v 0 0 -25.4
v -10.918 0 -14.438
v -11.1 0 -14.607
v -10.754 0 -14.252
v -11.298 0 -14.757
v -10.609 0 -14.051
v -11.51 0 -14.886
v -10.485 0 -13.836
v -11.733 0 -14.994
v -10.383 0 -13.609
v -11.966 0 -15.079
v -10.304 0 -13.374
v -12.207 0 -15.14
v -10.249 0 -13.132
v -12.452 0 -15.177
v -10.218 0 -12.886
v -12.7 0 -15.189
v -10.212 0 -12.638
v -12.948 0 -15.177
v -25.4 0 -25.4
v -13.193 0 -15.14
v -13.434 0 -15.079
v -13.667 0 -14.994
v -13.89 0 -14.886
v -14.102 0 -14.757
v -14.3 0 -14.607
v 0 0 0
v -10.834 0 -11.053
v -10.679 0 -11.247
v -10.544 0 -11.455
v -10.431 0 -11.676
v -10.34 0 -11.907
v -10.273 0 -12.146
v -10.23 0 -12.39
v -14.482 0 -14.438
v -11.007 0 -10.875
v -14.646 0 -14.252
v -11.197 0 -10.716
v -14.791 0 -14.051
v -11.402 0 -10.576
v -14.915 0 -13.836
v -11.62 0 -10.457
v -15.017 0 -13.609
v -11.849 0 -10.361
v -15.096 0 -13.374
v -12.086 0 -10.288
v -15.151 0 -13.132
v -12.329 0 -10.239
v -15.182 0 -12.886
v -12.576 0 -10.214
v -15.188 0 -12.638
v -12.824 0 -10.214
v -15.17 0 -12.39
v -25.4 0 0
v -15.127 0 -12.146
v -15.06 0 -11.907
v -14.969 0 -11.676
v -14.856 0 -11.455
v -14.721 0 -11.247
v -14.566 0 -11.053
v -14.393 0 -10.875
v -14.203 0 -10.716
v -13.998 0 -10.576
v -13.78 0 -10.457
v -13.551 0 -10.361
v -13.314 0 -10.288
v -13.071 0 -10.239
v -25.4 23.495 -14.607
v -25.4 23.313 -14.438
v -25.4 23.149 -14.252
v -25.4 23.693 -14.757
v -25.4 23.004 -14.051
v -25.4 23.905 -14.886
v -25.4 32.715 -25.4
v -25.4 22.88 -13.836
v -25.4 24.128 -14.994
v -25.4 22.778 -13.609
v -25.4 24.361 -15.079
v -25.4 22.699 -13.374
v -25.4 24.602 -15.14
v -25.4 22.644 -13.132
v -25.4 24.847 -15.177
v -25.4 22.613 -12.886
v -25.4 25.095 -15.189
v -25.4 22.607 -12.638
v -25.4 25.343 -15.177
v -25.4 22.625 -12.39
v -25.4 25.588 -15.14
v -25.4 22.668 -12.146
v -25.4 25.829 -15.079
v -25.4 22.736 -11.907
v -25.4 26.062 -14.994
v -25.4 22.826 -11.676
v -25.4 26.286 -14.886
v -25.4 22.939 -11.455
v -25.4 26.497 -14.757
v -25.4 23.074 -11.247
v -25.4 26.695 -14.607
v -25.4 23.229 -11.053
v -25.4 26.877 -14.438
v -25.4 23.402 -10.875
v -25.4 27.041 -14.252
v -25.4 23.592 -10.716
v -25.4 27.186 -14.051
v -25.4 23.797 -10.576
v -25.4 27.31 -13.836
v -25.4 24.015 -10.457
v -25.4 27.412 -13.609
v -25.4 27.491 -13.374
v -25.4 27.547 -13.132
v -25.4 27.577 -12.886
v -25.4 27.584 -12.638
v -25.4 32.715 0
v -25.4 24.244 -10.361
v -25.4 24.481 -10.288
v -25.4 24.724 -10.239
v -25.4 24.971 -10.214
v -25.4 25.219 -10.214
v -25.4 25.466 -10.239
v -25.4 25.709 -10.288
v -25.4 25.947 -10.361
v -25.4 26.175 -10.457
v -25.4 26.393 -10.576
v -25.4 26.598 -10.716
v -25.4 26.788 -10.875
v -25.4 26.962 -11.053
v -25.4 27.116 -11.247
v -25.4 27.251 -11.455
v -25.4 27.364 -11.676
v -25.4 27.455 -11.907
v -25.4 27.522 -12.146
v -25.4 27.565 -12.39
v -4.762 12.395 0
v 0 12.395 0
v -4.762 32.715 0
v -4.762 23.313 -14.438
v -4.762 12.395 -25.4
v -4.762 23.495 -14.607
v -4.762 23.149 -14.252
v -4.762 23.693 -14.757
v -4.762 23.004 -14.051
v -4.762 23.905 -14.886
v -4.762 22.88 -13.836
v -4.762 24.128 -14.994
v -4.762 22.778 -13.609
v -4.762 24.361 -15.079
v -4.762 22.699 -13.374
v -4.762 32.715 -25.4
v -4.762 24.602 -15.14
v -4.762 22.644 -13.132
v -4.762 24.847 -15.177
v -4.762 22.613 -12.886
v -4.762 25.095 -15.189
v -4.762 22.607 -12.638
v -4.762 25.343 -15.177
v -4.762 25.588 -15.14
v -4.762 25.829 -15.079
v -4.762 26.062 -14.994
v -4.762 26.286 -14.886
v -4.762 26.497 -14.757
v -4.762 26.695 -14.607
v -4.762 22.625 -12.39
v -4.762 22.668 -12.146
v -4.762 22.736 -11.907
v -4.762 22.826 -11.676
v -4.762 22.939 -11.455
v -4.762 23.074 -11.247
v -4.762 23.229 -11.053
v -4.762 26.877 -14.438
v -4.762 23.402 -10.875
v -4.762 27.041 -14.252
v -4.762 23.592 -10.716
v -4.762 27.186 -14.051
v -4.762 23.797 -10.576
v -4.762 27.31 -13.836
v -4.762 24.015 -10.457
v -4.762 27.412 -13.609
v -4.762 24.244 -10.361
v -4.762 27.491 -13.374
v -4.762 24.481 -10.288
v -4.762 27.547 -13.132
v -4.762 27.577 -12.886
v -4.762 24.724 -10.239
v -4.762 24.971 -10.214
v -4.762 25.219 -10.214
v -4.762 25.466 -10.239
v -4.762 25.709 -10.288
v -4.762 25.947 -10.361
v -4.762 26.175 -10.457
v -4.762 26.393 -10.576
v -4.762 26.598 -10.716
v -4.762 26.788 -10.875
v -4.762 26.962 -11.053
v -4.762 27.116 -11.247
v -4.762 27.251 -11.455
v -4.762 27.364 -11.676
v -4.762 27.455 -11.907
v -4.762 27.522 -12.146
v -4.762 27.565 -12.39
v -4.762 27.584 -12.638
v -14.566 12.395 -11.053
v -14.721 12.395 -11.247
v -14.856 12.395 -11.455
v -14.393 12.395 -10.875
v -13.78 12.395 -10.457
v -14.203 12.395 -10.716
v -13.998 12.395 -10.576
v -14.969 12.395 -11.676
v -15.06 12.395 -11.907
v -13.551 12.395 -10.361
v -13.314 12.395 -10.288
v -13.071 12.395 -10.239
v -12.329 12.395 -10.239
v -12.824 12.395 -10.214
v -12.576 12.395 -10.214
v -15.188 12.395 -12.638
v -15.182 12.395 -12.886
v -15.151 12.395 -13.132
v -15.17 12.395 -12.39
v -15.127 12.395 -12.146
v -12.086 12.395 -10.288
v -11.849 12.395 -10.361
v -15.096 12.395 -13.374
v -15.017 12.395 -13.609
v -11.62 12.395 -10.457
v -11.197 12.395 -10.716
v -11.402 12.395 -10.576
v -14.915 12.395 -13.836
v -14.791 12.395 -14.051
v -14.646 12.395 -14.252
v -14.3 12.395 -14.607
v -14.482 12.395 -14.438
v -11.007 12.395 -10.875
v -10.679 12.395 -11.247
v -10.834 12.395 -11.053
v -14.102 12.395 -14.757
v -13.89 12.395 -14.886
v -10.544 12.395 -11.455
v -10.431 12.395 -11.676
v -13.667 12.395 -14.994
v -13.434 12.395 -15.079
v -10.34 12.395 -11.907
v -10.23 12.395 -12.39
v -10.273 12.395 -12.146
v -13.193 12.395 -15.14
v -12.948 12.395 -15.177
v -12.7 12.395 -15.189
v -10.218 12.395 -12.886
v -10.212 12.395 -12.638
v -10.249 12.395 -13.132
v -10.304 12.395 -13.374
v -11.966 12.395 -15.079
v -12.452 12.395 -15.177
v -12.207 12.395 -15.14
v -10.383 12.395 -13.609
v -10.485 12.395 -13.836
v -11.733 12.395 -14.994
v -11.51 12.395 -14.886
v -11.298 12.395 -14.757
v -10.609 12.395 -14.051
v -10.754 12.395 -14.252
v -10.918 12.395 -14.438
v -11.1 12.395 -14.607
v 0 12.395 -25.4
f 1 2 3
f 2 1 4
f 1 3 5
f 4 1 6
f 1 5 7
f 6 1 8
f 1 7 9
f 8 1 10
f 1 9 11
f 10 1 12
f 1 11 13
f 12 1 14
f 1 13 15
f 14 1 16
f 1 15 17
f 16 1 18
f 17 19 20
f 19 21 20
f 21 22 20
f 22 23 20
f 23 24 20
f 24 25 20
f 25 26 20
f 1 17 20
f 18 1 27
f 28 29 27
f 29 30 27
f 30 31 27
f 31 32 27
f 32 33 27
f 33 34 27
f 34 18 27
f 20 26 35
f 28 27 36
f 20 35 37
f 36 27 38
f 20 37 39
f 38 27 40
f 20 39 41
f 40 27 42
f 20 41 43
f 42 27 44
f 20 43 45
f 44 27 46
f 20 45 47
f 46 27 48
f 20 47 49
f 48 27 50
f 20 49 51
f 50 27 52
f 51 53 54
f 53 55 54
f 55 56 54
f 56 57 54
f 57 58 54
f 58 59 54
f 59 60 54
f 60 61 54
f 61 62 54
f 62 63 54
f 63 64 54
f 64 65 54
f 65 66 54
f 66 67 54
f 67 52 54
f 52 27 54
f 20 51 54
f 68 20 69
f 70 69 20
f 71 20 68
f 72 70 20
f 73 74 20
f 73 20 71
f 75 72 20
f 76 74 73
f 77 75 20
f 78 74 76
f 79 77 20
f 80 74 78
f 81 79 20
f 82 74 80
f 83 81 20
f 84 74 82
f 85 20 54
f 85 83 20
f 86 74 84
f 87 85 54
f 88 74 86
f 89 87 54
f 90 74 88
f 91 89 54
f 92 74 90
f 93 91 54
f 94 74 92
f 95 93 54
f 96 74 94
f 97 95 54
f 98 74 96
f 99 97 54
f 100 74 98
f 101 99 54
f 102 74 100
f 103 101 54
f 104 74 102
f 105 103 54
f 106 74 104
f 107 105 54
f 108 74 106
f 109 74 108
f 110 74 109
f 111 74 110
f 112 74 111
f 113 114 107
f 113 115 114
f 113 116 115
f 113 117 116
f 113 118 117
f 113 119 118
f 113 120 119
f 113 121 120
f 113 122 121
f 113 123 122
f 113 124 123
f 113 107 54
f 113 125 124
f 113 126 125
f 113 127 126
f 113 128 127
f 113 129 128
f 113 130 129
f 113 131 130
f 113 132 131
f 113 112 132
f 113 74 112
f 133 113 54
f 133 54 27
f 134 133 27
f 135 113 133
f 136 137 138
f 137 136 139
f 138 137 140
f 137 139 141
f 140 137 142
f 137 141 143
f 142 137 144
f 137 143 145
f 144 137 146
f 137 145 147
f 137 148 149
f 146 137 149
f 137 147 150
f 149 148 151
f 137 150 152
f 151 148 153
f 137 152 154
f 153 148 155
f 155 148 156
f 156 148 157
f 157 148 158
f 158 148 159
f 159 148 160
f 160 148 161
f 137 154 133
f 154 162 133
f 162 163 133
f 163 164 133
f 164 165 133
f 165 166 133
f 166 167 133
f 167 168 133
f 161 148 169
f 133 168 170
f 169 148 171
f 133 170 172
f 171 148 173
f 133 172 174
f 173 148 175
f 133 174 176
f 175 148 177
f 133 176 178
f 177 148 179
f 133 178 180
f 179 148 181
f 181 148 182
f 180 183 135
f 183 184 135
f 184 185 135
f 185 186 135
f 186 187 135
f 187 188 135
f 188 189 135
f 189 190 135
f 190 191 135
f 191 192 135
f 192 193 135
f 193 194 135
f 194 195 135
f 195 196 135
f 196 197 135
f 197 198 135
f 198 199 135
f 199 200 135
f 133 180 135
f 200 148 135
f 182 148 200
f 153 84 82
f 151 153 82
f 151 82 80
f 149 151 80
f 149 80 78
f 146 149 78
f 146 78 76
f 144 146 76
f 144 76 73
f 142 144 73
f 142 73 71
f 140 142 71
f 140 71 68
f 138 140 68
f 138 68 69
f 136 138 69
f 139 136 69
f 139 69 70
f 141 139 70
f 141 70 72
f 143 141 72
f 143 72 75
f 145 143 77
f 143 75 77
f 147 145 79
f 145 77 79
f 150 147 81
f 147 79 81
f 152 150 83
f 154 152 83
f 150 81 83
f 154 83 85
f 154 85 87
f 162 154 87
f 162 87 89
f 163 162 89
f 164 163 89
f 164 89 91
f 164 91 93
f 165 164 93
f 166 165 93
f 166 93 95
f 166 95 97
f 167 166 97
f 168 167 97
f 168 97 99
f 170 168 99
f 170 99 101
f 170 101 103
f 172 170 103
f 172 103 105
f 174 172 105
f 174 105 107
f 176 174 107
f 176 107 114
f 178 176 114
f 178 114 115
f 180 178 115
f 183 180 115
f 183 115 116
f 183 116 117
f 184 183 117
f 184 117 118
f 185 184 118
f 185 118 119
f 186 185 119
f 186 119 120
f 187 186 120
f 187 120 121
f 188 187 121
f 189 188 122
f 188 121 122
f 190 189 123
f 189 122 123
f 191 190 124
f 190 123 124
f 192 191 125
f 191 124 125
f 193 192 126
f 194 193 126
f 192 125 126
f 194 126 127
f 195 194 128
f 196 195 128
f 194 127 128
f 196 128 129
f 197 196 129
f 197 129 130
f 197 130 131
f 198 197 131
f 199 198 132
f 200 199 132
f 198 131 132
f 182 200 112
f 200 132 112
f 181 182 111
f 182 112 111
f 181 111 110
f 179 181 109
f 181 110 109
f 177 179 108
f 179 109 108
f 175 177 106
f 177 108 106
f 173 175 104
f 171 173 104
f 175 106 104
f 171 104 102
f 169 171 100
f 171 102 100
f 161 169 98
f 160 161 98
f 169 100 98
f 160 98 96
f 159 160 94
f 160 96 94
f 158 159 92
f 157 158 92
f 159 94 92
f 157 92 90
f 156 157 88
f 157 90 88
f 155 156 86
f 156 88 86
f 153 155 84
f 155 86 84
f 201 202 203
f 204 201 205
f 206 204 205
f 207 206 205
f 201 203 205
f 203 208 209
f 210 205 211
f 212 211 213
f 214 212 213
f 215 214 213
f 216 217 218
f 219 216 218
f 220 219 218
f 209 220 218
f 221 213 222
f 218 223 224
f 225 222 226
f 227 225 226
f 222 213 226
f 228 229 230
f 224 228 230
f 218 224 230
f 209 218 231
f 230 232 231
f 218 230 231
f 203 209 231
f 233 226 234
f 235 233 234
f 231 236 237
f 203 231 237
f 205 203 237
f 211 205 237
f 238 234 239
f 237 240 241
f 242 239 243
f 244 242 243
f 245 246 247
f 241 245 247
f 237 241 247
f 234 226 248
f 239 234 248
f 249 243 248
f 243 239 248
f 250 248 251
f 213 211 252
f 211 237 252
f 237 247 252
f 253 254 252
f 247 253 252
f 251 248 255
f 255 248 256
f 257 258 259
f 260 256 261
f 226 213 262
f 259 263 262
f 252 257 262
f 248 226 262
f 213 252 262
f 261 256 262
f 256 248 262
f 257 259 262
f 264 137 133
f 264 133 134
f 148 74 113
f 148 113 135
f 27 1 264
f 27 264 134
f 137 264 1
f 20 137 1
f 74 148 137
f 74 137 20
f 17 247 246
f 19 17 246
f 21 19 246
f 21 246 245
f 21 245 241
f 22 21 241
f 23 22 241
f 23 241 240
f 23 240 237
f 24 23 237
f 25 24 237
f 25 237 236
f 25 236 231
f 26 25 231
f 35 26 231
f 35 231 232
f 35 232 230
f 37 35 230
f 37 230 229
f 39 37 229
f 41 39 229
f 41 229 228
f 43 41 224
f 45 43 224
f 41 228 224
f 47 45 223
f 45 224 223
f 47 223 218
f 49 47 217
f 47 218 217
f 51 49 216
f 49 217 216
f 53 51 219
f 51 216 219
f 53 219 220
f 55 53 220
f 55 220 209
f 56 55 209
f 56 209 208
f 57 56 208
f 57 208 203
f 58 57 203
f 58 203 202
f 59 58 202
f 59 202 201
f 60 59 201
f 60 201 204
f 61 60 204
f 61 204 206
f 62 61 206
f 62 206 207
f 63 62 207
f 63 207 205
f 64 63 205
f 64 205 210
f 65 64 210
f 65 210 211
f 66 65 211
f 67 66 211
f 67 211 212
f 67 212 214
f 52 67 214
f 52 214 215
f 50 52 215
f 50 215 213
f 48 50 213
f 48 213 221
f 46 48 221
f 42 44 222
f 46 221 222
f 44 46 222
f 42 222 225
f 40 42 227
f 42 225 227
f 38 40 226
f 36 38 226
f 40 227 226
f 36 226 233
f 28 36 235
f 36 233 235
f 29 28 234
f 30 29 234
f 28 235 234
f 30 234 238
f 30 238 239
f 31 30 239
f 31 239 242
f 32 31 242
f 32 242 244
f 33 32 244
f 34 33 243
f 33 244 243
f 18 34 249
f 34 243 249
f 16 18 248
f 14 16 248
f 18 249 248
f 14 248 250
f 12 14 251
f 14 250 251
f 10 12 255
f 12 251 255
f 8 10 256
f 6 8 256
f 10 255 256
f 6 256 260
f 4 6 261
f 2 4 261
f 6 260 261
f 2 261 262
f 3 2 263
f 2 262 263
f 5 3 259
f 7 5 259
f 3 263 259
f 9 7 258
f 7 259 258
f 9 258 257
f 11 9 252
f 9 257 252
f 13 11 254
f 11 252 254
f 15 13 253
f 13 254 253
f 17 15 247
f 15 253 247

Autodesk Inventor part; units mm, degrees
ref_plane "YZ Plane" through (0, 0, 0) normal (1, 0, 0) x (0, 1, 0)
ref_plane "XZ Plane" through (0, 0, 0) normal (0, 1, 0) x (-1, 0, 0)
ref_plane "XY Plane" through (0, 0, 0) normal (0, 0, 1) x (1, 0, 0)
sketch "Sketch1" plane through (0, 0, 0) normal (0, 1, 0) x (-1, 0, 0)
  line L0 (0, 0) -> (25.4, 0)
  line L1 (25.4, 0) -> (25.4, -25.4)
  line L2 (25.4, -25.4) -> (0, -25.4)
  line L3 (0, -25.4) -> (0, 0)
  dimension "d0" = 25.4
  dimension "d1" = 25.4
extrude "Extrusion1" add sketch "Sketch1" along normal blind 37.7952
sketch "Sketch2" plane through (0, 0, 0) normal (0, -1, 0) x (1, 0, 0)
  line L0 (0, 0) -> (0, -25.4) projected
  line L1 (-25.4, 0) -> (0, 0) projected
  point P0 (-12.7, -12.7)
  point P1 (-12.7, 0)
  dimension "d4" = 12.7
  dimension "d5" = 12.7
hole "Hole1" at (-12.7, 0, -12.7) direction (0, 1, 0) diameter 4.9784 depth 19.05 thread size "1/4-20 UNC" class "2B" standard "ANSI Unified Screw Threads"
sketch "Sketch3" plane through (-25.4, 0, -25.4) normal (-1, 0, 0) x (0, 0, 1)
  line L0 (0, 37.7952) -> (25.4, 37.7952) projected
  line L1 (0, 0) -> (0, 37.7952) projected
  point P0 (25.4, 0)
  point P1 (12.7, 25.0952)
  dimension "d13" = 12.7
  dimension "d14" = 12.7
hole "Hole2" at (-25.4, 25.0952, -12.7) direction (1, 0, 0) diameter 4.9784 end through all thread size "1/4-20 UNC" class "2B" standard "ANSI Unified Screw Threads"
sketch "Sketch4" plane through (0, 37.7952, 0) normal (0, 1, 0) x (1, 0, 0)
  line L0 (0, 25.4) -> (-25.4, 25.4) projected
  line L1 (-25.4, 25.4) -> (-25.4, 0) projected
  line L2 (-25.4, 0) -> (0, 0) projected
  line L3 (0, 0) -> (0, 25.4) projected
  line L4 (-4.7625, 25.4) -> (-4.7625, 0)
  line L5 (-25.4, 0) -> (0, 0) projected
  dimension "d22" = 4.7625
extrude "Extrusion2" cut sketch "Sketch4" against normal blind 25.4
extrude "Extrusion3" add sketch "Sketch4" against normal blind 25.4 contours L4 L2 L1 L0
sketch "Sketch6" plane through (-4.7625, 37.7952, 0) normal (1, 0, 0) x (0, 0, -1)
  line L0 (0, 0) -> (25.4, 0) projected
  line L1 (0, 0) -> (0, -25.4) projected
  point P0 (0, -37.7952)
  point P1 (12.7, -12.7)
  point P2 (12.7, 0)
  point P3 (0, -12.7)
  dimension "d28" = 12.7
  dimension "d29" = 12.7
hole "Hole3" at (-4.7625, 25.0952, -12.7) direction (-1, 0, 0) diameter 4.9784 end through all thread size "1/4-20 UNC" class "2B" standard "ANSI Unified Screw Threads"
sketch "Sketch7" plane through (0, 0, 0) normal (0, -1, 0) x (1, 0, 0)
  point P0 (0, 0)
sketch "Sketch8" plane through (0, 37.7952, 0) normal (0, 1, 0) x (1, 0, 0)
  line L0 (0, 25.4) -> (-25.4, 25.4) projected
  line L1 (0, 25.4) -> (0, 0) projected
  line L2 (-25.4, 25.4) -> (0, 25.4)
  line L3 (0, 25.4) -> (0, 0)
  line L4 (0, 0) -> (-25.4, 0)
  line L5 (-25.4, 0) -> (-25.4, 25.4)
extrude "Extrusion4" cut sketch "Sketch8" against normal blind 5.08
properties part number "DragBarLinkage3 Billet"
